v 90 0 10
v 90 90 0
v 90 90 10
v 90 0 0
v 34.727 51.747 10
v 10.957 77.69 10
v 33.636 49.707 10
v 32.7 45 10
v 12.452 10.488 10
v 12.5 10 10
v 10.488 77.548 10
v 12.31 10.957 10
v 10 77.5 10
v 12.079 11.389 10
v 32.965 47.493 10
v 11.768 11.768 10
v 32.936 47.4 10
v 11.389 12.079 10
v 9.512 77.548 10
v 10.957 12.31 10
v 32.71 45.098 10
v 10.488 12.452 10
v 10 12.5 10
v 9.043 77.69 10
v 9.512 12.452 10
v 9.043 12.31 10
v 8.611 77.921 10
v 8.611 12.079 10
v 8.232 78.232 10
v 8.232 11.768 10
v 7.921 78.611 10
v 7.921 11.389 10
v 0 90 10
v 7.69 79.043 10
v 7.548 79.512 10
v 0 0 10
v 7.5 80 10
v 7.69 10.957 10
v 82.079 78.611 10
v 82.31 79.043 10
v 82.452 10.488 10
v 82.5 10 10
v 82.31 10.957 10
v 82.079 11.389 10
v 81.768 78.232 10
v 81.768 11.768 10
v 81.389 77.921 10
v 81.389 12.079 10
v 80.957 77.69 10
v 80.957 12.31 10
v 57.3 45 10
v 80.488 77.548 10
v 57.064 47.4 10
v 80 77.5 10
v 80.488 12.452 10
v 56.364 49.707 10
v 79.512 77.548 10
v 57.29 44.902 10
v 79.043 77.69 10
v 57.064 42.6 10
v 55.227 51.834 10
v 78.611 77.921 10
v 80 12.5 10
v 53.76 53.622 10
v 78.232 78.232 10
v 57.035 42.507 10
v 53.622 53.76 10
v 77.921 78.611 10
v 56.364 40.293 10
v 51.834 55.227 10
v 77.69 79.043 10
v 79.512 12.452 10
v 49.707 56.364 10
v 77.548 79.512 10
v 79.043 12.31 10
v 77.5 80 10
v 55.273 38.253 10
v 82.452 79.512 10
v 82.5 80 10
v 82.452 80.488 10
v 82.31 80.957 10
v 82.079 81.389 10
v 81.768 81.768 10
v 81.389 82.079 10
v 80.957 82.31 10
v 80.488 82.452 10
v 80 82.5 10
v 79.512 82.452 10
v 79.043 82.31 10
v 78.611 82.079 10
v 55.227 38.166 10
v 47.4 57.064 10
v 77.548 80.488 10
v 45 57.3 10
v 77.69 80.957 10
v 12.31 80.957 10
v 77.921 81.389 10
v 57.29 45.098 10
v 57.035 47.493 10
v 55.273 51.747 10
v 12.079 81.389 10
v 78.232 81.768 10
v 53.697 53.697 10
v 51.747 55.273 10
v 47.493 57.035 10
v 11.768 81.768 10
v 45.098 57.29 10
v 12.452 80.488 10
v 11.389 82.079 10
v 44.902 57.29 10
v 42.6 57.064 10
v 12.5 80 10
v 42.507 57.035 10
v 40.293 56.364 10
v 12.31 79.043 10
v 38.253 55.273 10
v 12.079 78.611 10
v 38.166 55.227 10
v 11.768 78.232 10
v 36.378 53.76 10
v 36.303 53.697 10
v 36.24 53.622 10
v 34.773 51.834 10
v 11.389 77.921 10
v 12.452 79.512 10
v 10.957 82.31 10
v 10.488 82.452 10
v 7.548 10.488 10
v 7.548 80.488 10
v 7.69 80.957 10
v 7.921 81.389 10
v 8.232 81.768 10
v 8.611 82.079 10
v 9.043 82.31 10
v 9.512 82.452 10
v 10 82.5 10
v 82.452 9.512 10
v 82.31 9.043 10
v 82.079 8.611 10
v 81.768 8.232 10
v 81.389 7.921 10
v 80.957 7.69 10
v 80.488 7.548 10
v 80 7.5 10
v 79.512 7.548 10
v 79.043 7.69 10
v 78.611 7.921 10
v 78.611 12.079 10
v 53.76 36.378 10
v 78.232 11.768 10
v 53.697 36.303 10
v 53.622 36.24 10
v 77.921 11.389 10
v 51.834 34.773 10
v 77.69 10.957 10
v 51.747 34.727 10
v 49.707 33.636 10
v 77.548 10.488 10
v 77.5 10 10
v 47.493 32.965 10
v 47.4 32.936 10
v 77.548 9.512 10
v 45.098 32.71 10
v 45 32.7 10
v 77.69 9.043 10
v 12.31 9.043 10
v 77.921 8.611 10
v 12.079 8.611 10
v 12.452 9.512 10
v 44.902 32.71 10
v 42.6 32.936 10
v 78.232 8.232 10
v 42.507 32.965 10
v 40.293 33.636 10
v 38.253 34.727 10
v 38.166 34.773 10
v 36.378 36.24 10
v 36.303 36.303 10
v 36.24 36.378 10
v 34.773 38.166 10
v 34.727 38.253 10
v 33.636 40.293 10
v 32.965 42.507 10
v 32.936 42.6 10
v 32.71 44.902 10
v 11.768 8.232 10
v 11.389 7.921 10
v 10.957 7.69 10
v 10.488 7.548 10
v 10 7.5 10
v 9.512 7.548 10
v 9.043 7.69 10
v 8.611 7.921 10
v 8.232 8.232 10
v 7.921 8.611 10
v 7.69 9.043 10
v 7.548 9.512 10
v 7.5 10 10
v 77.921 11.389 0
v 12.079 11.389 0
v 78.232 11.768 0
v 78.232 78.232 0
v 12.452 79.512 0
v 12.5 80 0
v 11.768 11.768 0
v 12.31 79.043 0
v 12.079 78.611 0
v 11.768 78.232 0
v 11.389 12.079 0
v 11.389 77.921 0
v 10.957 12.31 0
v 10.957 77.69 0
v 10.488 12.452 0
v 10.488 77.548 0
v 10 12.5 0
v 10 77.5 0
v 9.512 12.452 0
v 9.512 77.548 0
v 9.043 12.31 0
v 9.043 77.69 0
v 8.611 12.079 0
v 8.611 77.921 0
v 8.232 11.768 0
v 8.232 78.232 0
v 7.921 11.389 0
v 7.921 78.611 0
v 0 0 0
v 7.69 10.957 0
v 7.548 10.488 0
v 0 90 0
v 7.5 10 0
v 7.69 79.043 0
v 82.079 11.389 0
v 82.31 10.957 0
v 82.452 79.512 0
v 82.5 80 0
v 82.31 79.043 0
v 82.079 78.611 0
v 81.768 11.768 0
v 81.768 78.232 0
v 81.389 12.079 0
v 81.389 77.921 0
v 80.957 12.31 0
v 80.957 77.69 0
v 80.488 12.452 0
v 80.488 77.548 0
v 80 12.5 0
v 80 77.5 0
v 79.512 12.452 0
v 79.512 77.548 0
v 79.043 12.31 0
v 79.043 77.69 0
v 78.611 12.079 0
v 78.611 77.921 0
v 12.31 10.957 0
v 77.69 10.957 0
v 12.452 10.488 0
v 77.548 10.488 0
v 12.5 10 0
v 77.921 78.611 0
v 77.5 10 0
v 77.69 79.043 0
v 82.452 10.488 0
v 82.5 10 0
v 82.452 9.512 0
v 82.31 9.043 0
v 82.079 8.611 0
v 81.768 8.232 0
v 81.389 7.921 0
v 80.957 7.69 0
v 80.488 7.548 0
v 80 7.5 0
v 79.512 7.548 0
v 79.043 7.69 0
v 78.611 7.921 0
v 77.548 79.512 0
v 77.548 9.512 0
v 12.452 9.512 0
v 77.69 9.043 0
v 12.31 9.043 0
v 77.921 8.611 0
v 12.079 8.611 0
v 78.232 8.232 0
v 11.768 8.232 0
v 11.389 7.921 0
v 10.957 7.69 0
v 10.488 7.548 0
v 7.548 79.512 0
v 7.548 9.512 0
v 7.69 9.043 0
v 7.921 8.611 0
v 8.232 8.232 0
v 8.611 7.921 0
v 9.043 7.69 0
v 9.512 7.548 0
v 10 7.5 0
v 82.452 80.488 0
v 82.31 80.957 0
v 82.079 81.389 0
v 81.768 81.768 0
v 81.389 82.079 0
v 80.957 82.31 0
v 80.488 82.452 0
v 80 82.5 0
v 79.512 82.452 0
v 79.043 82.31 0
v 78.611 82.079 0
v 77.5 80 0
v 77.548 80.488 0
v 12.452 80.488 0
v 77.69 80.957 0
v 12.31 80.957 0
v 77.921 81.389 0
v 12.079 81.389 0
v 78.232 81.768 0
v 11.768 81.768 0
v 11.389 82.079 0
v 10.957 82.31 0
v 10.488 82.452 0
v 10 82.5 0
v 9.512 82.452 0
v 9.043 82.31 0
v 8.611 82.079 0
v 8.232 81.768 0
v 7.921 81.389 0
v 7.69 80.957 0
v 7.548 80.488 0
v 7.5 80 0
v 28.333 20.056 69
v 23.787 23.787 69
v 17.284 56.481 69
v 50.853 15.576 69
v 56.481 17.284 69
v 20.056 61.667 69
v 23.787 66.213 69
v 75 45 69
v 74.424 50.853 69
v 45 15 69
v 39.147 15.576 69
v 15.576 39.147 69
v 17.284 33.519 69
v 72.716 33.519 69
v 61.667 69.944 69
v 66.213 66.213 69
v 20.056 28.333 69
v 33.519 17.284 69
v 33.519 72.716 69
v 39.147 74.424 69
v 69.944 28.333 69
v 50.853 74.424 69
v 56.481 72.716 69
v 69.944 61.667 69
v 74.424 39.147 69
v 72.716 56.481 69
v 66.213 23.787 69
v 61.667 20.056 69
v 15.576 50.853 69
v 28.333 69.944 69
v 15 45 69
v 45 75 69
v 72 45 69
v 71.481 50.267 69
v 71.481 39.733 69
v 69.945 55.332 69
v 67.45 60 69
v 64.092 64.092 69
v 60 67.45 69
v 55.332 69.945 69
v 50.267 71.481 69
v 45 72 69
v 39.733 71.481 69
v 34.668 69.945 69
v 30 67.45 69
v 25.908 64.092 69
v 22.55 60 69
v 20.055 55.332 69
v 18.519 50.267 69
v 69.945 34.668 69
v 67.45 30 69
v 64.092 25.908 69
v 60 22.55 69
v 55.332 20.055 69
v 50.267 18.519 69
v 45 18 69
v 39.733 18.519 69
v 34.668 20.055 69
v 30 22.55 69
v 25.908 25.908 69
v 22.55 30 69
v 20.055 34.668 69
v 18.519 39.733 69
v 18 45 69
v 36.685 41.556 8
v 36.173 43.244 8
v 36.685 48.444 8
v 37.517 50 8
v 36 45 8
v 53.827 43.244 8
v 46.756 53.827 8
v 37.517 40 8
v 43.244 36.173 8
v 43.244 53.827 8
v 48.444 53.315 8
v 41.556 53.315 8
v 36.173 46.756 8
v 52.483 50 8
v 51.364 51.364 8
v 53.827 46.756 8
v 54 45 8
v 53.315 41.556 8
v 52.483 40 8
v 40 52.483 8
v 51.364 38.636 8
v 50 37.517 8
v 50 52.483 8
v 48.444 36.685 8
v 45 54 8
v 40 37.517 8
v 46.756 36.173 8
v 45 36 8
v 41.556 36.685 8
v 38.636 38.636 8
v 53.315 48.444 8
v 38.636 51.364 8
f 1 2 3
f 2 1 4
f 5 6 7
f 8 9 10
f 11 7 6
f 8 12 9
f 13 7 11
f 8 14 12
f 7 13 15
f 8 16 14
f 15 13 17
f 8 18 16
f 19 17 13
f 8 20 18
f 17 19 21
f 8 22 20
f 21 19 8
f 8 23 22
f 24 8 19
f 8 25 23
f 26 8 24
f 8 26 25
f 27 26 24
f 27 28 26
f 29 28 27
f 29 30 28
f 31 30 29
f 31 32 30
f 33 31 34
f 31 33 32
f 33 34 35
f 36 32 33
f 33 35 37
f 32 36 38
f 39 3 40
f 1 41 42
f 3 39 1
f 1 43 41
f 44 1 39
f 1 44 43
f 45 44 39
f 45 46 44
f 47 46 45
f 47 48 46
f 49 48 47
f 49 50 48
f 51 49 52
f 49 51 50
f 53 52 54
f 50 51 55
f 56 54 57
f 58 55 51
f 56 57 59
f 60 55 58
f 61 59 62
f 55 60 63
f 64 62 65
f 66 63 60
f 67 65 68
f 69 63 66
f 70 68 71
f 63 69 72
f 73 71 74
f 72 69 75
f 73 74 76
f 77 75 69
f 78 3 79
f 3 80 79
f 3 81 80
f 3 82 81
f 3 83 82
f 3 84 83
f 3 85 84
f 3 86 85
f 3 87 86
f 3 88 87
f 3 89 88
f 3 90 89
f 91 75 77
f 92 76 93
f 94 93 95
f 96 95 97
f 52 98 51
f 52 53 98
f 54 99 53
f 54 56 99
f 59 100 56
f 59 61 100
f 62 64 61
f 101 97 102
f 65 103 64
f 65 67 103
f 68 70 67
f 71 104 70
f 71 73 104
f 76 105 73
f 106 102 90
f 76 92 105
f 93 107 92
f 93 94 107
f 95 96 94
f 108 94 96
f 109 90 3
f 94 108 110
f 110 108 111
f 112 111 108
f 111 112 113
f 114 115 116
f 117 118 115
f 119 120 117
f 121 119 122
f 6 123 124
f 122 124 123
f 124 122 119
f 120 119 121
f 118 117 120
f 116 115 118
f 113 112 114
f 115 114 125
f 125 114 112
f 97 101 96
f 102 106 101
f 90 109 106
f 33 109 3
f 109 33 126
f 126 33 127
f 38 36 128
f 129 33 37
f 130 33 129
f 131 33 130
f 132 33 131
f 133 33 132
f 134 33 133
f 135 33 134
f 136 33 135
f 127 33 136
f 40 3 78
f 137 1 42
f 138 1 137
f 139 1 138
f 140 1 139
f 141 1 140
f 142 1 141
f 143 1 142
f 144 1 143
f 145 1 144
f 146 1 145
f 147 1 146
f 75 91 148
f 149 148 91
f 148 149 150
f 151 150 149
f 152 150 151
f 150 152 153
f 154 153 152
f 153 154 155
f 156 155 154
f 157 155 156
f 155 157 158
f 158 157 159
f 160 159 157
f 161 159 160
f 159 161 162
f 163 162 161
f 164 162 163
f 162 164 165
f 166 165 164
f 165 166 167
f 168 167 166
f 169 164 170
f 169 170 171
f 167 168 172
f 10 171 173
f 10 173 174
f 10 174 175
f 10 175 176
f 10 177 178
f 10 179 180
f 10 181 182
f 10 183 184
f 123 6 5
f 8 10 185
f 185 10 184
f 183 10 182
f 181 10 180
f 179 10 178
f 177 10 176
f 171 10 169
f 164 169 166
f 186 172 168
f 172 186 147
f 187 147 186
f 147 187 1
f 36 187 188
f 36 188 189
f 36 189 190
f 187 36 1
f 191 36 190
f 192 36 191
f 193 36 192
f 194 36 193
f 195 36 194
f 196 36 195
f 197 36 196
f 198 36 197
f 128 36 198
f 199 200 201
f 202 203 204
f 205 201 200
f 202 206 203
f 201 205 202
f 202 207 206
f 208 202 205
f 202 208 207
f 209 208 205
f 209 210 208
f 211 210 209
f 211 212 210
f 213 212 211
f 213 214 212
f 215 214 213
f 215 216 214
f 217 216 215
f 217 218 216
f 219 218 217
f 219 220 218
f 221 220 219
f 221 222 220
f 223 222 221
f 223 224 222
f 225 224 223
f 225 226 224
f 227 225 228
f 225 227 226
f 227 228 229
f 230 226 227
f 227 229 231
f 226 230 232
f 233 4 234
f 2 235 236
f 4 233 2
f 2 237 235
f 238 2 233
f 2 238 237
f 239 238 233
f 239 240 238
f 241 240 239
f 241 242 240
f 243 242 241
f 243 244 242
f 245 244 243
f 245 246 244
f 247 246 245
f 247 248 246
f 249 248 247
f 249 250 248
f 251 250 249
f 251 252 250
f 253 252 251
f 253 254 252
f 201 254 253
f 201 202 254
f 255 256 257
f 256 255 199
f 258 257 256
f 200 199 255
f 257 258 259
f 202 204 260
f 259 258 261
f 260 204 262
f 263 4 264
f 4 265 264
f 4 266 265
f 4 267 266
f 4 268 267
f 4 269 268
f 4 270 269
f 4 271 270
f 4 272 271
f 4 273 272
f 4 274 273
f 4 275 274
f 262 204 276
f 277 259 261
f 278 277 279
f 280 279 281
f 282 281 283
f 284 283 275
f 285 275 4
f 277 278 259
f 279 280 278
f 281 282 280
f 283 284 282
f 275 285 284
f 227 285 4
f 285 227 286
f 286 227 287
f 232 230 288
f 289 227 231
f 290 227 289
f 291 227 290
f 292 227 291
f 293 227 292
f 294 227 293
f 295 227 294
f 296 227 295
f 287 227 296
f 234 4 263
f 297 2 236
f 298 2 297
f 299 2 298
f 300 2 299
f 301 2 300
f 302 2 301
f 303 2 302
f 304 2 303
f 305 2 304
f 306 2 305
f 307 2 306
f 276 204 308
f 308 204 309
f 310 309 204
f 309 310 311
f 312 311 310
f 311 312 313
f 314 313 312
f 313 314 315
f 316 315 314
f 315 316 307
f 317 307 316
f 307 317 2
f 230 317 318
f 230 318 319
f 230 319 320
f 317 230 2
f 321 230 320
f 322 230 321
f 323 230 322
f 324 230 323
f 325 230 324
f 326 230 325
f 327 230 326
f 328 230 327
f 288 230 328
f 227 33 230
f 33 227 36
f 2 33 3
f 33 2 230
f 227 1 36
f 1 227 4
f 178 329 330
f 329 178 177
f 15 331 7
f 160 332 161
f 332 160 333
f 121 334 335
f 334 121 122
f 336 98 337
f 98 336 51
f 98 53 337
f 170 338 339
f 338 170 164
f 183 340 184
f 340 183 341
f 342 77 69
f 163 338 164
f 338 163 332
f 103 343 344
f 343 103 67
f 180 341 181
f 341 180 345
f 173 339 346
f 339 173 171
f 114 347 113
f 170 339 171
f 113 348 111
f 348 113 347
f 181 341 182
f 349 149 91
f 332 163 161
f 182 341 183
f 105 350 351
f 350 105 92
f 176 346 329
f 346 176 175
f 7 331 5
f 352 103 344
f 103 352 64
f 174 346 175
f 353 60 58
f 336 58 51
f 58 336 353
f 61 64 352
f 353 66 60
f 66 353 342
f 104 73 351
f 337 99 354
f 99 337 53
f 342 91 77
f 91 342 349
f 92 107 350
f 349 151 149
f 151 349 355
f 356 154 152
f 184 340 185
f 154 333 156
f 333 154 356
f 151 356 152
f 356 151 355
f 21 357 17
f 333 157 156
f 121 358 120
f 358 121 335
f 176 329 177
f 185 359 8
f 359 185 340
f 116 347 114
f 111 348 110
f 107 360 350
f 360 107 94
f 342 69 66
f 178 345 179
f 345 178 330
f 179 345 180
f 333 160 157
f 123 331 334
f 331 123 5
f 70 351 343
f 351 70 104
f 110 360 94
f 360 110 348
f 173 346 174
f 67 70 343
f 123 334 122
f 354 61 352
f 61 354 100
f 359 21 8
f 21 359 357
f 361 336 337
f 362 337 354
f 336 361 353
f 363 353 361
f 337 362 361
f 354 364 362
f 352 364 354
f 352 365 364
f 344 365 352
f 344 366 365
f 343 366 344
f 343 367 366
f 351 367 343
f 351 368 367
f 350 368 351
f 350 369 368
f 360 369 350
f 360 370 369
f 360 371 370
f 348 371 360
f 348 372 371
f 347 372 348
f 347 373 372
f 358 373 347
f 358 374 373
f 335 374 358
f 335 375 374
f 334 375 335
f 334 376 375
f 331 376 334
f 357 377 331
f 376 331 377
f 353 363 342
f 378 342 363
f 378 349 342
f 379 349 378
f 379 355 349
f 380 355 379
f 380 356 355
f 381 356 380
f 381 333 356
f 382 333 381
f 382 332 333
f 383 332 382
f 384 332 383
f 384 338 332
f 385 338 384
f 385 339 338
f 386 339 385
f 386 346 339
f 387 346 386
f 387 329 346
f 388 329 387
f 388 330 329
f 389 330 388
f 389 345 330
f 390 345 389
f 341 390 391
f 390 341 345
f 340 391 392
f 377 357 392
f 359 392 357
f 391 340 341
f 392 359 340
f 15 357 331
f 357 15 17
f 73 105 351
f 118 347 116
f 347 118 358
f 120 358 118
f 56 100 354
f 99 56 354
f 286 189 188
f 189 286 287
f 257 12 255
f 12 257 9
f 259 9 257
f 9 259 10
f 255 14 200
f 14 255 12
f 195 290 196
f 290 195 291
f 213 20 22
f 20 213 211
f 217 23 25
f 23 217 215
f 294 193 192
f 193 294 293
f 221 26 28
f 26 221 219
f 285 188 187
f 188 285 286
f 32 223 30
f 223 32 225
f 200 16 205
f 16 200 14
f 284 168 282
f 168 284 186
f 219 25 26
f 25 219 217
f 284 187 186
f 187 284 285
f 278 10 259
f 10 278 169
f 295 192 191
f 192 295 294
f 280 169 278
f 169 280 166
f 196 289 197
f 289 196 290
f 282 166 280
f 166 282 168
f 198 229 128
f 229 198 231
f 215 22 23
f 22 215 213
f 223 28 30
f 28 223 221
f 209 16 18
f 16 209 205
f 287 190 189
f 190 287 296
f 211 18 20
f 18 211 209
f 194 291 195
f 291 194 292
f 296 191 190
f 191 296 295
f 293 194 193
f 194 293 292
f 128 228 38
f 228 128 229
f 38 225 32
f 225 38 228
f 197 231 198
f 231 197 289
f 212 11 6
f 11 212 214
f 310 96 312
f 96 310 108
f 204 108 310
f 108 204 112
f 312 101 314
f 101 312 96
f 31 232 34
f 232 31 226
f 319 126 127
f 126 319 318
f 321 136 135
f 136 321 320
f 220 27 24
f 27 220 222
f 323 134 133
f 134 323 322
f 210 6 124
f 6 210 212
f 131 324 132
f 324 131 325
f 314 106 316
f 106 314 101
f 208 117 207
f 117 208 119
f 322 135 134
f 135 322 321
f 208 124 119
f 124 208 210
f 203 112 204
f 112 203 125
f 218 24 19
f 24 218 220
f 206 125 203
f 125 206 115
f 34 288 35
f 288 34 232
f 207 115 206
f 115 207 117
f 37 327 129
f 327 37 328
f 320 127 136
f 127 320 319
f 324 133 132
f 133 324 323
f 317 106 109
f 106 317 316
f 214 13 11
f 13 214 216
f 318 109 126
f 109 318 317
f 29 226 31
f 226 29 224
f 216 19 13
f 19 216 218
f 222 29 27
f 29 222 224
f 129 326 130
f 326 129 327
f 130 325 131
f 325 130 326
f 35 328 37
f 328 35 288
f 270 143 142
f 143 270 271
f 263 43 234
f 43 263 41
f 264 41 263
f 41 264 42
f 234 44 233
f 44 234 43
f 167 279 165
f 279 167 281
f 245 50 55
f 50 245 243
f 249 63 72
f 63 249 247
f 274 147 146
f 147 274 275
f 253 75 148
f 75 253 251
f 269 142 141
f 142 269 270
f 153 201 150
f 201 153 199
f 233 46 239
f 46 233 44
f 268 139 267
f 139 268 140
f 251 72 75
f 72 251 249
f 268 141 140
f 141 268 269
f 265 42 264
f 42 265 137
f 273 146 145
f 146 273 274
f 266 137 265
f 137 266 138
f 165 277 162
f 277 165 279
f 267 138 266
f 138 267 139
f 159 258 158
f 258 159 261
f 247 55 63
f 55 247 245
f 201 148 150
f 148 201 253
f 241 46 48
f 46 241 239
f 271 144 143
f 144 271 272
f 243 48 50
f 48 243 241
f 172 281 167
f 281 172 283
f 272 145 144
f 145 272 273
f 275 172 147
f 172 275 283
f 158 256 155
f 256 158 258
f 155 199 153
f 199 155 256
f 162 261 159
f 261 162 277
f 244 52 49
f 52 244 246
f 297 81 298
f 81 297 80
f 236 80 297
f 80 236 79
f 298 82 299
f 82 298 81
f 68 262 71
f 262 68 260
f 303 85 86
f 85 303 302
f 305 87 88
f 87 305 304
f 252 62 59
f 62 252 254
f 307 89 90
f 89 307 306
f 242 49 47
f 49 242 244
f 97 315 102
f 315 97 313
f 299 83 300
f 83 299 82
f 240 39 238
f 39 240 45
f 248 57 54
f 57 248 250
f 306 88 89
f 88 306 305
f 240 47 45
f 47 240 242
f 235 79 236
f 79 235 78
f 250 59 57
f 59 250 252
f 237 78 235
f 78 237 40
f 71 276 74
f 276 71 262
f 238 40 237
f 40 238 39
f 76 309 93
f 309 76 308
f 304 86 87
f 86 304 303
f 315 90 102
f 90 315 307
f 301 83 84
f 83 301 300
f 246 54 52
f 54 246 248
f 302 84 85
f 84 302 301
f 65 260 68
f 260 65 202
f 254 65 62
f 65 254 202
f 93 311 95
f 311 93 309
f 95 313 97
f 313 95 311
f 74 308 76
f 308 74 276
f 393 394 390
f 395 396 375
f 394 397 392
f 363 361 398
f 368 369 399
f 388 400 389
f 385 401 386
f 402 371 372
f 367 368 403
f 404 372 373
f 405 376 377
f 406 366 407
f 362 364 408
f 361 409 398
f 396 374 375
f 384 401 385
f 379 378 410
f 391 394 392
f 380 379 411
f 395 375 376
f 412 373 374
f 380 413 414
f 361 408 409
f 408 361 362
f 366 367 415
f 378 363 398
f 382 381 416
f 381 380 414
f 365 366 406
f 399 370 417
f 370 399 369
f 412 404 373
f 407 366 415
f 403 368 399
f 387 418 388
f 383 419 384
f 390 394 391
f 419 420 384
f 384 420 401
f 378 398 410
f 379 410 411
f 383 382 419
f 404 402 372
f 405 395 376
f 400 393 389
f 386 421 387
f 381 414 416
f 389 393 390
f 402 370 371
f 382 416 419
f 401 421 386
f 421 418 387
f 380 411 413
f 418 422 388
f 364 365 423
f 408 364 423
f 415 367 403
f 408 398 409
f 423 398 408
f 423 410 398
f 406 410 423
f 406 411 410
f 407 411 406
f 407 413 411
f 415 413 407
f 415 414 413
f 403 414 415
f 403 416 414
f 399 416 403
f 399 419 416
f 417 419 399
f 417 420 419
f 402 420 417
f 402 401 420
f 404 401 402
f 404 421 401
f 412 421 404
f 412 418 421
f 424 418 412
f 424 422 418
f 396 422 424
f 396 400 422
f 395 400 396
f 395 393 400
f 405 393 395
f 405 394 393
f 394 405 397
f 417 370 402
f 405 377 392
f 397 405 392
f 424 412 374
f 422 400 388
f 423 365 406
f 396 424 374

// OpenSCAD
$fn = 32;

// ----------------------------------------------------------------------
// Hopper: flanged with square flange
// ----------------------------------------------------------------------

// --- parameters (mm) ---
fl = 90;                  // flange side, X and Y
fl_t = 10;                // flange thickness
cone_h = 60;              // cone height above the flange
top_d = 60;               // cone mouth diameter
bot_d = 24;               // cone spout diameter
wall = 3;                 // cone wall thickness
hole_r = 2.5;             // flange hole radius
hole_in = 10;             // hole inset from the corners

bore_d = bot_d - 2 * wall;  // spout bore diameter
total_h = fl_t + cone_h - 1;  // overall height

difference() {
  union() {
    cube([fl, fl, fl_t]);
    translate([fl / 2, fl / 2, fl_t - 1])
      cylinder(h = cone_h, d1 = bot_d, d2 = top_d);
  }
  translate([fl / 2, fl / 2, fl_t - 2])
    cylinder(h = cone_h + 1, d1 = bore_d, d2 = top_d - 2 * wall);
  for (sx = [0, 1], sy = [0, 1])
    translate([sx ? fl - hole_in : hole_in,
               sy ? fl - hole_in : hole_in, -1])
      cylinder(r = hole_r, h = fl_t + 2);
}
